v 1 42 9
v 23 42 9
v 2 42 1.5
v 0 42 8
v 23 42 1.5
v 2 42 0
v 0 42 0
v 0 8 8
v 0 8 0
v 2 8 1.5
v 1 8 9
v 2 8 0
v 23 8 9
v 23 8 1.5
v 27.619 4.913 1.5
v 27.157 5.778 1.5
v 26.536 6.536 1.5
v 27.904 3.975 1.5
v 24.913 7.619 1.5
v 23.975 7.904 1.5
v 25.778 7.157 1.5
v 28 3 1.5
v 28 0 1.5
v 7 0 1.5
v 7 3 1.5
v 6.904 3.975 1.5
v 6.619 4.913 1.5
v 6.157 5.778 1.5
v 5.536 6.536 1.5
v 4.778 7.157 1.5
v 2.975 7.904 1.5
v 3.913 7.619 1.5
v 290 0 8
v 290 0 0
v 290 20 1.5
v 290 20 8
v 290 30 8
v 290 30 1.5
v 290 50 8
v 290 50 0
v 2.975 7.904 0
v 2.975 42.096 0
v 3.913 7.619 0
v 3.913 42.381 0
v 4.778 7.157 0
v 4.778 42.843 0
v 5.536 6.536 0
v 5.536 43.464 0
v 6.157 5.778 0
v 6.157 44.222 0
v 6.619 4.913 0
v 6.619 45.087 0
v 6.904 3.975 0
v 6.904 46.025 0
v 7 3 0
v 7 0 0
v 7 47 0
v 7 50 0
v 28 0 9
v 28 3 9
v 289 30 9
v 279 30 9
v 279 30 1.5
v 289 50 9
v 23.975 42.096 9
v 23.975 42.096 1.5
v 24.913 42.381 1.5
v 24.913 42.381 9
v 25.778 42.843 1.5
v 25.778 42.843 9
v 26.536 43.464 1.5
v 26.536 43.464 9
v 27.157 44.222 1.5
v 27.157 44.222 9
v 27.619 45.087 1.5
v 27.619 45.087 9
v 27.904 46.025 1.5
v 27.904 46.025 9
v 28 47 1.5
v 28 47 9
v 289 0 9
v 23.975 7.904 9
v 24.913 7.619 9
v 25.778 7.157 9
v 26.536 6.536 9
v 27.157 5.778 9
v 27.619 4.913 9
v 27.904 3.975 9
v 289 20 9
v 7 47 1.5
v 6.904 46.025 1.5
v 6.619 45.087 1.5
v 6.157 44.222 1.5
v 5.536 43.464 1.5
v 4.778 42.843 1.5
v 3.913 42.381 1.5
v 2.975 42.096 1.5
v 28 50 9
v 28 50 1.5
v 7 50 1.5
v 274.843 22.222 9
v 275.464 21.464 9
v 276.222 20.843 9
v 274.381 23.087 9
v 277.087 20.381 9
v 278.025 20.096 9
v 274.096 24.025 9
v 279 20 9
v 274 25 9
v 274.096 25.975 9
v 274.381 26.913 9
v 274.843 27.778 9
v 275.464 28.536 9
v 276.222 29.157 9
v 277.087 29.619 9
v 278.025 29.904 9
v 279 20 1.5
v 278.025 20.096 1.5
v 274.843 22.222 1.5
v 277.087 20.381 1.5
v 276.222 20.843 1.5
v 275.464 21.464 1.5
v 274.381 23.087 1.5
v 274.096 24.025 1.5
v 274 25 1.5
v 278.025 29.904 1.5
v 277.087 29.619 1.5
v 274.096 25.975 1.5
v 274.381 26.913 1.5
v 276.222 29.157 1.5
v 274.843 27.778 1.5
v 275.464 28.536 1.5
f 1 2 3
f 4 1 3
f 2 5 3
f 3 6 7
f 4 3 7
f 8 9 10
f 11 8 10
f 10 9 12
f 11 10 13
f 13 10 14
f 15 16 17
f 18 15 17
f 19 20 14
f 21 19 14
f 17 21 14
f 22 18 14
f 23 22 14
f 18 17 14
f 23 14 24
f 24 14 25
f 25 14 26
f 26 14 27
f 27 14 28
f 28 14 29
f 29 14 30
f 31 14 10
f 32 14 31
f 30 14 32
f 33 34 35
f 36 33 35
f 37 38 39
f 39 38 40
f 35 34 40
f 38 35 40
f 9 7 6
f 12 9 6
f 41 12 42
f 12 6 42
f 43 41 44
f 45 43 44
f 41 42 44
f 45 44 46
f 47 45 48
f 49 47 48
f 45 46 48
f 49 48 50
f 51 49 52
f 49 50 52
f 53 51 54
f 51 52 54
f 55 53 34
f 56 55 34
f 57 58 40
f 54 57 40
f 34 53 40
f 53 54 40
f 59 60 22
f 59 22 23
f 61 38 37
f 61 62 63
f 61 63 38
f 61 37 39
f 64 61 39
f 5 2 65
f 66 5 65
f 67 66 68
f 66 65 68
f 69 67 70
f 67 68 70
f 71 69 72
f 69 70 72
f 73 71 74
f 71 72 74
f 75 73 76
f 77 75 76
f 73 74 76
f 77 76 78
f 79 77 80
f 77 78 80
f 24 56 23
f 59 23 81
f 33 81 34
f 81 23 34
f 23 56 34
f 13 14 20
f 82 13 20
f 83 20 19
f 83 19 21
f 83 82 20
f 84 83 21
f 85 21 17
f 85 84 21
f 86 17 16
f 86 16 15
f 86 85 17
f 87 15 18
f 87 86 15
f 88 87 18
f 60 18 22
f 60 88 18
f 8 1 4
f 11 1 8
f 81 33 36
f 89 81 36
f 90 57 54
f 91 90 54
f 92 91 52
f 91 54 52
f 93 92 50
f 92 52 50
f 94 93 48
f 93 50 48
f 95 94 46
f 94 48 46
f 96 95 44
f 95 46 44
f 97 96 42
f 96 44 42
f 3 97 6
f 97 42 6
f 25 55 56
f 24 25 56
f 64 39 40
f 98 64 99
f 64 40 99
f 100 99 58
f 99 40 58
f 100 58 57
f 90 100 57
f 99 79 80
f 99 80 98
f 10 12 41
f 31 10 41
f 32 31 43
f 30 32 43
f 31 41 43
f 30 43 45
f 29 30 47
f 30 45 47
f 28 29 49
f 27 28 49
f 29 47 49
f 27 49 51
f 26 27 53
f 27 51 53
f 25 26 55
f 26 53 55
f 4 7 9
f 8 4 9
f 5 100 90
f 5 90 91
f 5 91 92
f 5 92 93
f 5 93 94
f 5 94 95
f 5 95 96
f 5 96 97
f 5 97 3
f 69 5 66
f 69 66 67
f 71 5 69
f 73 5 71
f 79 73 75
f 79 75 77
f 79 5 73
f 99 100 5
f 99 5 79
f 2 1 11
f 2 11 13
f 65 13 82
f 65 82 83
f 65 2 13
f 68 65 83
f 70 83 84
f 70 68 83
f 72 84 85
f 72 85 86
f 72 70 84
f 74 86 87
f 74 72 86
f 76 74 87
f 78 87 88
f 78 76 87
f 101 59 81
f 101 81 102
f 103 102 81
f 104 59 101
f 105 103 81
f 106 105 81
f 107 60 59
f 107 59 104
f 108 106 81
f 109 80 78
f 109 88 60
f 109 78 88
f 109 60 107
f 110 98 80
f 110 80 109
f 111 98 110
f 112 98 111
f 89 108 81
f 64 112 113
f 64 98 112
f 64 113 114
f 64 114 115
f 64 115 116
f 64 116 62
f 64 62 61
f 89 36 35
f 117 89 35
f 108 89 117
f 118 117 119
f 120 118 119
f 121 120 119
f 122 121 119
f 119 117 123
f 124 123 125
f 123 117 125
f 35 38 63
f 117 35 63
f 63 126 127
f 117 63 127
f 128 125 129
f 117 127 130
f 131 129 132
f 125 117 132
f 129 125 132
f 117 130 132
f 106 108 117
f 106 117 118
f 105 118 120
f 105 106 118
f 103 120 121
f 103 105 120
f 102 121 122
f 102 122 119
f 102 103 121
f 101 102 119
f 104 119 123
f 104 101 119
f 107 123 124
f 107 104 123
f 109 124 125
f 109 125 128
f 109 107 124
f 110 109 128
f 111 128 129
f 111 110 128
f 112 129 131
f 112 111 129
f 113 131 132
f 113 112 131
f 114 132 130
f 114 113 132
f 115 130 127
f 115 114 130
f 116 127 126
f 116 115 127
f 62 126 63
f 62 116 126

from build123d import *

# Parameters (mm, degrees)
BASE_EXTRUDE_DEPTH = 9
CUT_EXTRUDE1_DEPTH = 7.5
CHAMFER1_SIZE      = 1


with BuildPart() as part:
    # Sketch1 → Base-Extrude (new body)
    with BuildSketch(Plane.XY):
        with BuildLine():
            Line((7, 0), (290, 0))
            Line((290, 0), (290, 50))
            Line((290, 50), (7, 50))
            Line((7, 50), (7, 47))
            ThreePointArc((7, 47), (5.535533906, 43.464466094), (2, 42))
            Line((2, 42), (0, 42))
            Line((0, 42), (0, 8))
            Line((0, 8), (2, 8))
            ThreePointArc((2, 8), (5.535533906, 6.535533906), (7, 3))
            Line((7, 3), (7, 0))
        make_face()
    extrude(amount=BASE_EXTRUDE_DEPTH)

    # Sketch2 → Cut-Extrude1 (cut)
    with BuildSketch(Plane.XY.offset(9)):
        with BuildLine():
            Line((2, 8), (23, 8))
            ThreePointArc((23, 8), (26.535533906, 6.535533906), (28, 3))
            Line((28, 3), (28, 0))
            Line((28, 0), (2, 0))
            Line((2, 0), (2, 8))
        make_face()
        with BuildLine():
            Line((279, 30), (290, 30))
            Line((290, 30), (290, 20))
            Line((290, 20), (279, 20))
            ThreePointArc((279, 20), (274, 25), (279, 30))
        make_face()
        with BuildLine():
            Line((28, 47), (28, 50))
            Line((28, 50), (2, 50))
            Line((2, 50), (2, 42))
            Line((2, 42), (23, 42))
            ThreePointArc((23, 42), (26.535533906, 43.464466094), (28, 47))
        make_face()
    extrude(amount=-CUT_EXTRUDE1_DEPTH, mode=Mode.SUBTRACT)

    # Chamfer1
    chamfer1_edges = [part.edges().sort_by_distance(p)[0] for p in [
        (0, 25, 9),
        (290, 40, 9),
        (290, 10, 9),
    ]]
    chamfer(chamfer1_edges, length=CHAMFER1_SIZE)


solid = part.part
